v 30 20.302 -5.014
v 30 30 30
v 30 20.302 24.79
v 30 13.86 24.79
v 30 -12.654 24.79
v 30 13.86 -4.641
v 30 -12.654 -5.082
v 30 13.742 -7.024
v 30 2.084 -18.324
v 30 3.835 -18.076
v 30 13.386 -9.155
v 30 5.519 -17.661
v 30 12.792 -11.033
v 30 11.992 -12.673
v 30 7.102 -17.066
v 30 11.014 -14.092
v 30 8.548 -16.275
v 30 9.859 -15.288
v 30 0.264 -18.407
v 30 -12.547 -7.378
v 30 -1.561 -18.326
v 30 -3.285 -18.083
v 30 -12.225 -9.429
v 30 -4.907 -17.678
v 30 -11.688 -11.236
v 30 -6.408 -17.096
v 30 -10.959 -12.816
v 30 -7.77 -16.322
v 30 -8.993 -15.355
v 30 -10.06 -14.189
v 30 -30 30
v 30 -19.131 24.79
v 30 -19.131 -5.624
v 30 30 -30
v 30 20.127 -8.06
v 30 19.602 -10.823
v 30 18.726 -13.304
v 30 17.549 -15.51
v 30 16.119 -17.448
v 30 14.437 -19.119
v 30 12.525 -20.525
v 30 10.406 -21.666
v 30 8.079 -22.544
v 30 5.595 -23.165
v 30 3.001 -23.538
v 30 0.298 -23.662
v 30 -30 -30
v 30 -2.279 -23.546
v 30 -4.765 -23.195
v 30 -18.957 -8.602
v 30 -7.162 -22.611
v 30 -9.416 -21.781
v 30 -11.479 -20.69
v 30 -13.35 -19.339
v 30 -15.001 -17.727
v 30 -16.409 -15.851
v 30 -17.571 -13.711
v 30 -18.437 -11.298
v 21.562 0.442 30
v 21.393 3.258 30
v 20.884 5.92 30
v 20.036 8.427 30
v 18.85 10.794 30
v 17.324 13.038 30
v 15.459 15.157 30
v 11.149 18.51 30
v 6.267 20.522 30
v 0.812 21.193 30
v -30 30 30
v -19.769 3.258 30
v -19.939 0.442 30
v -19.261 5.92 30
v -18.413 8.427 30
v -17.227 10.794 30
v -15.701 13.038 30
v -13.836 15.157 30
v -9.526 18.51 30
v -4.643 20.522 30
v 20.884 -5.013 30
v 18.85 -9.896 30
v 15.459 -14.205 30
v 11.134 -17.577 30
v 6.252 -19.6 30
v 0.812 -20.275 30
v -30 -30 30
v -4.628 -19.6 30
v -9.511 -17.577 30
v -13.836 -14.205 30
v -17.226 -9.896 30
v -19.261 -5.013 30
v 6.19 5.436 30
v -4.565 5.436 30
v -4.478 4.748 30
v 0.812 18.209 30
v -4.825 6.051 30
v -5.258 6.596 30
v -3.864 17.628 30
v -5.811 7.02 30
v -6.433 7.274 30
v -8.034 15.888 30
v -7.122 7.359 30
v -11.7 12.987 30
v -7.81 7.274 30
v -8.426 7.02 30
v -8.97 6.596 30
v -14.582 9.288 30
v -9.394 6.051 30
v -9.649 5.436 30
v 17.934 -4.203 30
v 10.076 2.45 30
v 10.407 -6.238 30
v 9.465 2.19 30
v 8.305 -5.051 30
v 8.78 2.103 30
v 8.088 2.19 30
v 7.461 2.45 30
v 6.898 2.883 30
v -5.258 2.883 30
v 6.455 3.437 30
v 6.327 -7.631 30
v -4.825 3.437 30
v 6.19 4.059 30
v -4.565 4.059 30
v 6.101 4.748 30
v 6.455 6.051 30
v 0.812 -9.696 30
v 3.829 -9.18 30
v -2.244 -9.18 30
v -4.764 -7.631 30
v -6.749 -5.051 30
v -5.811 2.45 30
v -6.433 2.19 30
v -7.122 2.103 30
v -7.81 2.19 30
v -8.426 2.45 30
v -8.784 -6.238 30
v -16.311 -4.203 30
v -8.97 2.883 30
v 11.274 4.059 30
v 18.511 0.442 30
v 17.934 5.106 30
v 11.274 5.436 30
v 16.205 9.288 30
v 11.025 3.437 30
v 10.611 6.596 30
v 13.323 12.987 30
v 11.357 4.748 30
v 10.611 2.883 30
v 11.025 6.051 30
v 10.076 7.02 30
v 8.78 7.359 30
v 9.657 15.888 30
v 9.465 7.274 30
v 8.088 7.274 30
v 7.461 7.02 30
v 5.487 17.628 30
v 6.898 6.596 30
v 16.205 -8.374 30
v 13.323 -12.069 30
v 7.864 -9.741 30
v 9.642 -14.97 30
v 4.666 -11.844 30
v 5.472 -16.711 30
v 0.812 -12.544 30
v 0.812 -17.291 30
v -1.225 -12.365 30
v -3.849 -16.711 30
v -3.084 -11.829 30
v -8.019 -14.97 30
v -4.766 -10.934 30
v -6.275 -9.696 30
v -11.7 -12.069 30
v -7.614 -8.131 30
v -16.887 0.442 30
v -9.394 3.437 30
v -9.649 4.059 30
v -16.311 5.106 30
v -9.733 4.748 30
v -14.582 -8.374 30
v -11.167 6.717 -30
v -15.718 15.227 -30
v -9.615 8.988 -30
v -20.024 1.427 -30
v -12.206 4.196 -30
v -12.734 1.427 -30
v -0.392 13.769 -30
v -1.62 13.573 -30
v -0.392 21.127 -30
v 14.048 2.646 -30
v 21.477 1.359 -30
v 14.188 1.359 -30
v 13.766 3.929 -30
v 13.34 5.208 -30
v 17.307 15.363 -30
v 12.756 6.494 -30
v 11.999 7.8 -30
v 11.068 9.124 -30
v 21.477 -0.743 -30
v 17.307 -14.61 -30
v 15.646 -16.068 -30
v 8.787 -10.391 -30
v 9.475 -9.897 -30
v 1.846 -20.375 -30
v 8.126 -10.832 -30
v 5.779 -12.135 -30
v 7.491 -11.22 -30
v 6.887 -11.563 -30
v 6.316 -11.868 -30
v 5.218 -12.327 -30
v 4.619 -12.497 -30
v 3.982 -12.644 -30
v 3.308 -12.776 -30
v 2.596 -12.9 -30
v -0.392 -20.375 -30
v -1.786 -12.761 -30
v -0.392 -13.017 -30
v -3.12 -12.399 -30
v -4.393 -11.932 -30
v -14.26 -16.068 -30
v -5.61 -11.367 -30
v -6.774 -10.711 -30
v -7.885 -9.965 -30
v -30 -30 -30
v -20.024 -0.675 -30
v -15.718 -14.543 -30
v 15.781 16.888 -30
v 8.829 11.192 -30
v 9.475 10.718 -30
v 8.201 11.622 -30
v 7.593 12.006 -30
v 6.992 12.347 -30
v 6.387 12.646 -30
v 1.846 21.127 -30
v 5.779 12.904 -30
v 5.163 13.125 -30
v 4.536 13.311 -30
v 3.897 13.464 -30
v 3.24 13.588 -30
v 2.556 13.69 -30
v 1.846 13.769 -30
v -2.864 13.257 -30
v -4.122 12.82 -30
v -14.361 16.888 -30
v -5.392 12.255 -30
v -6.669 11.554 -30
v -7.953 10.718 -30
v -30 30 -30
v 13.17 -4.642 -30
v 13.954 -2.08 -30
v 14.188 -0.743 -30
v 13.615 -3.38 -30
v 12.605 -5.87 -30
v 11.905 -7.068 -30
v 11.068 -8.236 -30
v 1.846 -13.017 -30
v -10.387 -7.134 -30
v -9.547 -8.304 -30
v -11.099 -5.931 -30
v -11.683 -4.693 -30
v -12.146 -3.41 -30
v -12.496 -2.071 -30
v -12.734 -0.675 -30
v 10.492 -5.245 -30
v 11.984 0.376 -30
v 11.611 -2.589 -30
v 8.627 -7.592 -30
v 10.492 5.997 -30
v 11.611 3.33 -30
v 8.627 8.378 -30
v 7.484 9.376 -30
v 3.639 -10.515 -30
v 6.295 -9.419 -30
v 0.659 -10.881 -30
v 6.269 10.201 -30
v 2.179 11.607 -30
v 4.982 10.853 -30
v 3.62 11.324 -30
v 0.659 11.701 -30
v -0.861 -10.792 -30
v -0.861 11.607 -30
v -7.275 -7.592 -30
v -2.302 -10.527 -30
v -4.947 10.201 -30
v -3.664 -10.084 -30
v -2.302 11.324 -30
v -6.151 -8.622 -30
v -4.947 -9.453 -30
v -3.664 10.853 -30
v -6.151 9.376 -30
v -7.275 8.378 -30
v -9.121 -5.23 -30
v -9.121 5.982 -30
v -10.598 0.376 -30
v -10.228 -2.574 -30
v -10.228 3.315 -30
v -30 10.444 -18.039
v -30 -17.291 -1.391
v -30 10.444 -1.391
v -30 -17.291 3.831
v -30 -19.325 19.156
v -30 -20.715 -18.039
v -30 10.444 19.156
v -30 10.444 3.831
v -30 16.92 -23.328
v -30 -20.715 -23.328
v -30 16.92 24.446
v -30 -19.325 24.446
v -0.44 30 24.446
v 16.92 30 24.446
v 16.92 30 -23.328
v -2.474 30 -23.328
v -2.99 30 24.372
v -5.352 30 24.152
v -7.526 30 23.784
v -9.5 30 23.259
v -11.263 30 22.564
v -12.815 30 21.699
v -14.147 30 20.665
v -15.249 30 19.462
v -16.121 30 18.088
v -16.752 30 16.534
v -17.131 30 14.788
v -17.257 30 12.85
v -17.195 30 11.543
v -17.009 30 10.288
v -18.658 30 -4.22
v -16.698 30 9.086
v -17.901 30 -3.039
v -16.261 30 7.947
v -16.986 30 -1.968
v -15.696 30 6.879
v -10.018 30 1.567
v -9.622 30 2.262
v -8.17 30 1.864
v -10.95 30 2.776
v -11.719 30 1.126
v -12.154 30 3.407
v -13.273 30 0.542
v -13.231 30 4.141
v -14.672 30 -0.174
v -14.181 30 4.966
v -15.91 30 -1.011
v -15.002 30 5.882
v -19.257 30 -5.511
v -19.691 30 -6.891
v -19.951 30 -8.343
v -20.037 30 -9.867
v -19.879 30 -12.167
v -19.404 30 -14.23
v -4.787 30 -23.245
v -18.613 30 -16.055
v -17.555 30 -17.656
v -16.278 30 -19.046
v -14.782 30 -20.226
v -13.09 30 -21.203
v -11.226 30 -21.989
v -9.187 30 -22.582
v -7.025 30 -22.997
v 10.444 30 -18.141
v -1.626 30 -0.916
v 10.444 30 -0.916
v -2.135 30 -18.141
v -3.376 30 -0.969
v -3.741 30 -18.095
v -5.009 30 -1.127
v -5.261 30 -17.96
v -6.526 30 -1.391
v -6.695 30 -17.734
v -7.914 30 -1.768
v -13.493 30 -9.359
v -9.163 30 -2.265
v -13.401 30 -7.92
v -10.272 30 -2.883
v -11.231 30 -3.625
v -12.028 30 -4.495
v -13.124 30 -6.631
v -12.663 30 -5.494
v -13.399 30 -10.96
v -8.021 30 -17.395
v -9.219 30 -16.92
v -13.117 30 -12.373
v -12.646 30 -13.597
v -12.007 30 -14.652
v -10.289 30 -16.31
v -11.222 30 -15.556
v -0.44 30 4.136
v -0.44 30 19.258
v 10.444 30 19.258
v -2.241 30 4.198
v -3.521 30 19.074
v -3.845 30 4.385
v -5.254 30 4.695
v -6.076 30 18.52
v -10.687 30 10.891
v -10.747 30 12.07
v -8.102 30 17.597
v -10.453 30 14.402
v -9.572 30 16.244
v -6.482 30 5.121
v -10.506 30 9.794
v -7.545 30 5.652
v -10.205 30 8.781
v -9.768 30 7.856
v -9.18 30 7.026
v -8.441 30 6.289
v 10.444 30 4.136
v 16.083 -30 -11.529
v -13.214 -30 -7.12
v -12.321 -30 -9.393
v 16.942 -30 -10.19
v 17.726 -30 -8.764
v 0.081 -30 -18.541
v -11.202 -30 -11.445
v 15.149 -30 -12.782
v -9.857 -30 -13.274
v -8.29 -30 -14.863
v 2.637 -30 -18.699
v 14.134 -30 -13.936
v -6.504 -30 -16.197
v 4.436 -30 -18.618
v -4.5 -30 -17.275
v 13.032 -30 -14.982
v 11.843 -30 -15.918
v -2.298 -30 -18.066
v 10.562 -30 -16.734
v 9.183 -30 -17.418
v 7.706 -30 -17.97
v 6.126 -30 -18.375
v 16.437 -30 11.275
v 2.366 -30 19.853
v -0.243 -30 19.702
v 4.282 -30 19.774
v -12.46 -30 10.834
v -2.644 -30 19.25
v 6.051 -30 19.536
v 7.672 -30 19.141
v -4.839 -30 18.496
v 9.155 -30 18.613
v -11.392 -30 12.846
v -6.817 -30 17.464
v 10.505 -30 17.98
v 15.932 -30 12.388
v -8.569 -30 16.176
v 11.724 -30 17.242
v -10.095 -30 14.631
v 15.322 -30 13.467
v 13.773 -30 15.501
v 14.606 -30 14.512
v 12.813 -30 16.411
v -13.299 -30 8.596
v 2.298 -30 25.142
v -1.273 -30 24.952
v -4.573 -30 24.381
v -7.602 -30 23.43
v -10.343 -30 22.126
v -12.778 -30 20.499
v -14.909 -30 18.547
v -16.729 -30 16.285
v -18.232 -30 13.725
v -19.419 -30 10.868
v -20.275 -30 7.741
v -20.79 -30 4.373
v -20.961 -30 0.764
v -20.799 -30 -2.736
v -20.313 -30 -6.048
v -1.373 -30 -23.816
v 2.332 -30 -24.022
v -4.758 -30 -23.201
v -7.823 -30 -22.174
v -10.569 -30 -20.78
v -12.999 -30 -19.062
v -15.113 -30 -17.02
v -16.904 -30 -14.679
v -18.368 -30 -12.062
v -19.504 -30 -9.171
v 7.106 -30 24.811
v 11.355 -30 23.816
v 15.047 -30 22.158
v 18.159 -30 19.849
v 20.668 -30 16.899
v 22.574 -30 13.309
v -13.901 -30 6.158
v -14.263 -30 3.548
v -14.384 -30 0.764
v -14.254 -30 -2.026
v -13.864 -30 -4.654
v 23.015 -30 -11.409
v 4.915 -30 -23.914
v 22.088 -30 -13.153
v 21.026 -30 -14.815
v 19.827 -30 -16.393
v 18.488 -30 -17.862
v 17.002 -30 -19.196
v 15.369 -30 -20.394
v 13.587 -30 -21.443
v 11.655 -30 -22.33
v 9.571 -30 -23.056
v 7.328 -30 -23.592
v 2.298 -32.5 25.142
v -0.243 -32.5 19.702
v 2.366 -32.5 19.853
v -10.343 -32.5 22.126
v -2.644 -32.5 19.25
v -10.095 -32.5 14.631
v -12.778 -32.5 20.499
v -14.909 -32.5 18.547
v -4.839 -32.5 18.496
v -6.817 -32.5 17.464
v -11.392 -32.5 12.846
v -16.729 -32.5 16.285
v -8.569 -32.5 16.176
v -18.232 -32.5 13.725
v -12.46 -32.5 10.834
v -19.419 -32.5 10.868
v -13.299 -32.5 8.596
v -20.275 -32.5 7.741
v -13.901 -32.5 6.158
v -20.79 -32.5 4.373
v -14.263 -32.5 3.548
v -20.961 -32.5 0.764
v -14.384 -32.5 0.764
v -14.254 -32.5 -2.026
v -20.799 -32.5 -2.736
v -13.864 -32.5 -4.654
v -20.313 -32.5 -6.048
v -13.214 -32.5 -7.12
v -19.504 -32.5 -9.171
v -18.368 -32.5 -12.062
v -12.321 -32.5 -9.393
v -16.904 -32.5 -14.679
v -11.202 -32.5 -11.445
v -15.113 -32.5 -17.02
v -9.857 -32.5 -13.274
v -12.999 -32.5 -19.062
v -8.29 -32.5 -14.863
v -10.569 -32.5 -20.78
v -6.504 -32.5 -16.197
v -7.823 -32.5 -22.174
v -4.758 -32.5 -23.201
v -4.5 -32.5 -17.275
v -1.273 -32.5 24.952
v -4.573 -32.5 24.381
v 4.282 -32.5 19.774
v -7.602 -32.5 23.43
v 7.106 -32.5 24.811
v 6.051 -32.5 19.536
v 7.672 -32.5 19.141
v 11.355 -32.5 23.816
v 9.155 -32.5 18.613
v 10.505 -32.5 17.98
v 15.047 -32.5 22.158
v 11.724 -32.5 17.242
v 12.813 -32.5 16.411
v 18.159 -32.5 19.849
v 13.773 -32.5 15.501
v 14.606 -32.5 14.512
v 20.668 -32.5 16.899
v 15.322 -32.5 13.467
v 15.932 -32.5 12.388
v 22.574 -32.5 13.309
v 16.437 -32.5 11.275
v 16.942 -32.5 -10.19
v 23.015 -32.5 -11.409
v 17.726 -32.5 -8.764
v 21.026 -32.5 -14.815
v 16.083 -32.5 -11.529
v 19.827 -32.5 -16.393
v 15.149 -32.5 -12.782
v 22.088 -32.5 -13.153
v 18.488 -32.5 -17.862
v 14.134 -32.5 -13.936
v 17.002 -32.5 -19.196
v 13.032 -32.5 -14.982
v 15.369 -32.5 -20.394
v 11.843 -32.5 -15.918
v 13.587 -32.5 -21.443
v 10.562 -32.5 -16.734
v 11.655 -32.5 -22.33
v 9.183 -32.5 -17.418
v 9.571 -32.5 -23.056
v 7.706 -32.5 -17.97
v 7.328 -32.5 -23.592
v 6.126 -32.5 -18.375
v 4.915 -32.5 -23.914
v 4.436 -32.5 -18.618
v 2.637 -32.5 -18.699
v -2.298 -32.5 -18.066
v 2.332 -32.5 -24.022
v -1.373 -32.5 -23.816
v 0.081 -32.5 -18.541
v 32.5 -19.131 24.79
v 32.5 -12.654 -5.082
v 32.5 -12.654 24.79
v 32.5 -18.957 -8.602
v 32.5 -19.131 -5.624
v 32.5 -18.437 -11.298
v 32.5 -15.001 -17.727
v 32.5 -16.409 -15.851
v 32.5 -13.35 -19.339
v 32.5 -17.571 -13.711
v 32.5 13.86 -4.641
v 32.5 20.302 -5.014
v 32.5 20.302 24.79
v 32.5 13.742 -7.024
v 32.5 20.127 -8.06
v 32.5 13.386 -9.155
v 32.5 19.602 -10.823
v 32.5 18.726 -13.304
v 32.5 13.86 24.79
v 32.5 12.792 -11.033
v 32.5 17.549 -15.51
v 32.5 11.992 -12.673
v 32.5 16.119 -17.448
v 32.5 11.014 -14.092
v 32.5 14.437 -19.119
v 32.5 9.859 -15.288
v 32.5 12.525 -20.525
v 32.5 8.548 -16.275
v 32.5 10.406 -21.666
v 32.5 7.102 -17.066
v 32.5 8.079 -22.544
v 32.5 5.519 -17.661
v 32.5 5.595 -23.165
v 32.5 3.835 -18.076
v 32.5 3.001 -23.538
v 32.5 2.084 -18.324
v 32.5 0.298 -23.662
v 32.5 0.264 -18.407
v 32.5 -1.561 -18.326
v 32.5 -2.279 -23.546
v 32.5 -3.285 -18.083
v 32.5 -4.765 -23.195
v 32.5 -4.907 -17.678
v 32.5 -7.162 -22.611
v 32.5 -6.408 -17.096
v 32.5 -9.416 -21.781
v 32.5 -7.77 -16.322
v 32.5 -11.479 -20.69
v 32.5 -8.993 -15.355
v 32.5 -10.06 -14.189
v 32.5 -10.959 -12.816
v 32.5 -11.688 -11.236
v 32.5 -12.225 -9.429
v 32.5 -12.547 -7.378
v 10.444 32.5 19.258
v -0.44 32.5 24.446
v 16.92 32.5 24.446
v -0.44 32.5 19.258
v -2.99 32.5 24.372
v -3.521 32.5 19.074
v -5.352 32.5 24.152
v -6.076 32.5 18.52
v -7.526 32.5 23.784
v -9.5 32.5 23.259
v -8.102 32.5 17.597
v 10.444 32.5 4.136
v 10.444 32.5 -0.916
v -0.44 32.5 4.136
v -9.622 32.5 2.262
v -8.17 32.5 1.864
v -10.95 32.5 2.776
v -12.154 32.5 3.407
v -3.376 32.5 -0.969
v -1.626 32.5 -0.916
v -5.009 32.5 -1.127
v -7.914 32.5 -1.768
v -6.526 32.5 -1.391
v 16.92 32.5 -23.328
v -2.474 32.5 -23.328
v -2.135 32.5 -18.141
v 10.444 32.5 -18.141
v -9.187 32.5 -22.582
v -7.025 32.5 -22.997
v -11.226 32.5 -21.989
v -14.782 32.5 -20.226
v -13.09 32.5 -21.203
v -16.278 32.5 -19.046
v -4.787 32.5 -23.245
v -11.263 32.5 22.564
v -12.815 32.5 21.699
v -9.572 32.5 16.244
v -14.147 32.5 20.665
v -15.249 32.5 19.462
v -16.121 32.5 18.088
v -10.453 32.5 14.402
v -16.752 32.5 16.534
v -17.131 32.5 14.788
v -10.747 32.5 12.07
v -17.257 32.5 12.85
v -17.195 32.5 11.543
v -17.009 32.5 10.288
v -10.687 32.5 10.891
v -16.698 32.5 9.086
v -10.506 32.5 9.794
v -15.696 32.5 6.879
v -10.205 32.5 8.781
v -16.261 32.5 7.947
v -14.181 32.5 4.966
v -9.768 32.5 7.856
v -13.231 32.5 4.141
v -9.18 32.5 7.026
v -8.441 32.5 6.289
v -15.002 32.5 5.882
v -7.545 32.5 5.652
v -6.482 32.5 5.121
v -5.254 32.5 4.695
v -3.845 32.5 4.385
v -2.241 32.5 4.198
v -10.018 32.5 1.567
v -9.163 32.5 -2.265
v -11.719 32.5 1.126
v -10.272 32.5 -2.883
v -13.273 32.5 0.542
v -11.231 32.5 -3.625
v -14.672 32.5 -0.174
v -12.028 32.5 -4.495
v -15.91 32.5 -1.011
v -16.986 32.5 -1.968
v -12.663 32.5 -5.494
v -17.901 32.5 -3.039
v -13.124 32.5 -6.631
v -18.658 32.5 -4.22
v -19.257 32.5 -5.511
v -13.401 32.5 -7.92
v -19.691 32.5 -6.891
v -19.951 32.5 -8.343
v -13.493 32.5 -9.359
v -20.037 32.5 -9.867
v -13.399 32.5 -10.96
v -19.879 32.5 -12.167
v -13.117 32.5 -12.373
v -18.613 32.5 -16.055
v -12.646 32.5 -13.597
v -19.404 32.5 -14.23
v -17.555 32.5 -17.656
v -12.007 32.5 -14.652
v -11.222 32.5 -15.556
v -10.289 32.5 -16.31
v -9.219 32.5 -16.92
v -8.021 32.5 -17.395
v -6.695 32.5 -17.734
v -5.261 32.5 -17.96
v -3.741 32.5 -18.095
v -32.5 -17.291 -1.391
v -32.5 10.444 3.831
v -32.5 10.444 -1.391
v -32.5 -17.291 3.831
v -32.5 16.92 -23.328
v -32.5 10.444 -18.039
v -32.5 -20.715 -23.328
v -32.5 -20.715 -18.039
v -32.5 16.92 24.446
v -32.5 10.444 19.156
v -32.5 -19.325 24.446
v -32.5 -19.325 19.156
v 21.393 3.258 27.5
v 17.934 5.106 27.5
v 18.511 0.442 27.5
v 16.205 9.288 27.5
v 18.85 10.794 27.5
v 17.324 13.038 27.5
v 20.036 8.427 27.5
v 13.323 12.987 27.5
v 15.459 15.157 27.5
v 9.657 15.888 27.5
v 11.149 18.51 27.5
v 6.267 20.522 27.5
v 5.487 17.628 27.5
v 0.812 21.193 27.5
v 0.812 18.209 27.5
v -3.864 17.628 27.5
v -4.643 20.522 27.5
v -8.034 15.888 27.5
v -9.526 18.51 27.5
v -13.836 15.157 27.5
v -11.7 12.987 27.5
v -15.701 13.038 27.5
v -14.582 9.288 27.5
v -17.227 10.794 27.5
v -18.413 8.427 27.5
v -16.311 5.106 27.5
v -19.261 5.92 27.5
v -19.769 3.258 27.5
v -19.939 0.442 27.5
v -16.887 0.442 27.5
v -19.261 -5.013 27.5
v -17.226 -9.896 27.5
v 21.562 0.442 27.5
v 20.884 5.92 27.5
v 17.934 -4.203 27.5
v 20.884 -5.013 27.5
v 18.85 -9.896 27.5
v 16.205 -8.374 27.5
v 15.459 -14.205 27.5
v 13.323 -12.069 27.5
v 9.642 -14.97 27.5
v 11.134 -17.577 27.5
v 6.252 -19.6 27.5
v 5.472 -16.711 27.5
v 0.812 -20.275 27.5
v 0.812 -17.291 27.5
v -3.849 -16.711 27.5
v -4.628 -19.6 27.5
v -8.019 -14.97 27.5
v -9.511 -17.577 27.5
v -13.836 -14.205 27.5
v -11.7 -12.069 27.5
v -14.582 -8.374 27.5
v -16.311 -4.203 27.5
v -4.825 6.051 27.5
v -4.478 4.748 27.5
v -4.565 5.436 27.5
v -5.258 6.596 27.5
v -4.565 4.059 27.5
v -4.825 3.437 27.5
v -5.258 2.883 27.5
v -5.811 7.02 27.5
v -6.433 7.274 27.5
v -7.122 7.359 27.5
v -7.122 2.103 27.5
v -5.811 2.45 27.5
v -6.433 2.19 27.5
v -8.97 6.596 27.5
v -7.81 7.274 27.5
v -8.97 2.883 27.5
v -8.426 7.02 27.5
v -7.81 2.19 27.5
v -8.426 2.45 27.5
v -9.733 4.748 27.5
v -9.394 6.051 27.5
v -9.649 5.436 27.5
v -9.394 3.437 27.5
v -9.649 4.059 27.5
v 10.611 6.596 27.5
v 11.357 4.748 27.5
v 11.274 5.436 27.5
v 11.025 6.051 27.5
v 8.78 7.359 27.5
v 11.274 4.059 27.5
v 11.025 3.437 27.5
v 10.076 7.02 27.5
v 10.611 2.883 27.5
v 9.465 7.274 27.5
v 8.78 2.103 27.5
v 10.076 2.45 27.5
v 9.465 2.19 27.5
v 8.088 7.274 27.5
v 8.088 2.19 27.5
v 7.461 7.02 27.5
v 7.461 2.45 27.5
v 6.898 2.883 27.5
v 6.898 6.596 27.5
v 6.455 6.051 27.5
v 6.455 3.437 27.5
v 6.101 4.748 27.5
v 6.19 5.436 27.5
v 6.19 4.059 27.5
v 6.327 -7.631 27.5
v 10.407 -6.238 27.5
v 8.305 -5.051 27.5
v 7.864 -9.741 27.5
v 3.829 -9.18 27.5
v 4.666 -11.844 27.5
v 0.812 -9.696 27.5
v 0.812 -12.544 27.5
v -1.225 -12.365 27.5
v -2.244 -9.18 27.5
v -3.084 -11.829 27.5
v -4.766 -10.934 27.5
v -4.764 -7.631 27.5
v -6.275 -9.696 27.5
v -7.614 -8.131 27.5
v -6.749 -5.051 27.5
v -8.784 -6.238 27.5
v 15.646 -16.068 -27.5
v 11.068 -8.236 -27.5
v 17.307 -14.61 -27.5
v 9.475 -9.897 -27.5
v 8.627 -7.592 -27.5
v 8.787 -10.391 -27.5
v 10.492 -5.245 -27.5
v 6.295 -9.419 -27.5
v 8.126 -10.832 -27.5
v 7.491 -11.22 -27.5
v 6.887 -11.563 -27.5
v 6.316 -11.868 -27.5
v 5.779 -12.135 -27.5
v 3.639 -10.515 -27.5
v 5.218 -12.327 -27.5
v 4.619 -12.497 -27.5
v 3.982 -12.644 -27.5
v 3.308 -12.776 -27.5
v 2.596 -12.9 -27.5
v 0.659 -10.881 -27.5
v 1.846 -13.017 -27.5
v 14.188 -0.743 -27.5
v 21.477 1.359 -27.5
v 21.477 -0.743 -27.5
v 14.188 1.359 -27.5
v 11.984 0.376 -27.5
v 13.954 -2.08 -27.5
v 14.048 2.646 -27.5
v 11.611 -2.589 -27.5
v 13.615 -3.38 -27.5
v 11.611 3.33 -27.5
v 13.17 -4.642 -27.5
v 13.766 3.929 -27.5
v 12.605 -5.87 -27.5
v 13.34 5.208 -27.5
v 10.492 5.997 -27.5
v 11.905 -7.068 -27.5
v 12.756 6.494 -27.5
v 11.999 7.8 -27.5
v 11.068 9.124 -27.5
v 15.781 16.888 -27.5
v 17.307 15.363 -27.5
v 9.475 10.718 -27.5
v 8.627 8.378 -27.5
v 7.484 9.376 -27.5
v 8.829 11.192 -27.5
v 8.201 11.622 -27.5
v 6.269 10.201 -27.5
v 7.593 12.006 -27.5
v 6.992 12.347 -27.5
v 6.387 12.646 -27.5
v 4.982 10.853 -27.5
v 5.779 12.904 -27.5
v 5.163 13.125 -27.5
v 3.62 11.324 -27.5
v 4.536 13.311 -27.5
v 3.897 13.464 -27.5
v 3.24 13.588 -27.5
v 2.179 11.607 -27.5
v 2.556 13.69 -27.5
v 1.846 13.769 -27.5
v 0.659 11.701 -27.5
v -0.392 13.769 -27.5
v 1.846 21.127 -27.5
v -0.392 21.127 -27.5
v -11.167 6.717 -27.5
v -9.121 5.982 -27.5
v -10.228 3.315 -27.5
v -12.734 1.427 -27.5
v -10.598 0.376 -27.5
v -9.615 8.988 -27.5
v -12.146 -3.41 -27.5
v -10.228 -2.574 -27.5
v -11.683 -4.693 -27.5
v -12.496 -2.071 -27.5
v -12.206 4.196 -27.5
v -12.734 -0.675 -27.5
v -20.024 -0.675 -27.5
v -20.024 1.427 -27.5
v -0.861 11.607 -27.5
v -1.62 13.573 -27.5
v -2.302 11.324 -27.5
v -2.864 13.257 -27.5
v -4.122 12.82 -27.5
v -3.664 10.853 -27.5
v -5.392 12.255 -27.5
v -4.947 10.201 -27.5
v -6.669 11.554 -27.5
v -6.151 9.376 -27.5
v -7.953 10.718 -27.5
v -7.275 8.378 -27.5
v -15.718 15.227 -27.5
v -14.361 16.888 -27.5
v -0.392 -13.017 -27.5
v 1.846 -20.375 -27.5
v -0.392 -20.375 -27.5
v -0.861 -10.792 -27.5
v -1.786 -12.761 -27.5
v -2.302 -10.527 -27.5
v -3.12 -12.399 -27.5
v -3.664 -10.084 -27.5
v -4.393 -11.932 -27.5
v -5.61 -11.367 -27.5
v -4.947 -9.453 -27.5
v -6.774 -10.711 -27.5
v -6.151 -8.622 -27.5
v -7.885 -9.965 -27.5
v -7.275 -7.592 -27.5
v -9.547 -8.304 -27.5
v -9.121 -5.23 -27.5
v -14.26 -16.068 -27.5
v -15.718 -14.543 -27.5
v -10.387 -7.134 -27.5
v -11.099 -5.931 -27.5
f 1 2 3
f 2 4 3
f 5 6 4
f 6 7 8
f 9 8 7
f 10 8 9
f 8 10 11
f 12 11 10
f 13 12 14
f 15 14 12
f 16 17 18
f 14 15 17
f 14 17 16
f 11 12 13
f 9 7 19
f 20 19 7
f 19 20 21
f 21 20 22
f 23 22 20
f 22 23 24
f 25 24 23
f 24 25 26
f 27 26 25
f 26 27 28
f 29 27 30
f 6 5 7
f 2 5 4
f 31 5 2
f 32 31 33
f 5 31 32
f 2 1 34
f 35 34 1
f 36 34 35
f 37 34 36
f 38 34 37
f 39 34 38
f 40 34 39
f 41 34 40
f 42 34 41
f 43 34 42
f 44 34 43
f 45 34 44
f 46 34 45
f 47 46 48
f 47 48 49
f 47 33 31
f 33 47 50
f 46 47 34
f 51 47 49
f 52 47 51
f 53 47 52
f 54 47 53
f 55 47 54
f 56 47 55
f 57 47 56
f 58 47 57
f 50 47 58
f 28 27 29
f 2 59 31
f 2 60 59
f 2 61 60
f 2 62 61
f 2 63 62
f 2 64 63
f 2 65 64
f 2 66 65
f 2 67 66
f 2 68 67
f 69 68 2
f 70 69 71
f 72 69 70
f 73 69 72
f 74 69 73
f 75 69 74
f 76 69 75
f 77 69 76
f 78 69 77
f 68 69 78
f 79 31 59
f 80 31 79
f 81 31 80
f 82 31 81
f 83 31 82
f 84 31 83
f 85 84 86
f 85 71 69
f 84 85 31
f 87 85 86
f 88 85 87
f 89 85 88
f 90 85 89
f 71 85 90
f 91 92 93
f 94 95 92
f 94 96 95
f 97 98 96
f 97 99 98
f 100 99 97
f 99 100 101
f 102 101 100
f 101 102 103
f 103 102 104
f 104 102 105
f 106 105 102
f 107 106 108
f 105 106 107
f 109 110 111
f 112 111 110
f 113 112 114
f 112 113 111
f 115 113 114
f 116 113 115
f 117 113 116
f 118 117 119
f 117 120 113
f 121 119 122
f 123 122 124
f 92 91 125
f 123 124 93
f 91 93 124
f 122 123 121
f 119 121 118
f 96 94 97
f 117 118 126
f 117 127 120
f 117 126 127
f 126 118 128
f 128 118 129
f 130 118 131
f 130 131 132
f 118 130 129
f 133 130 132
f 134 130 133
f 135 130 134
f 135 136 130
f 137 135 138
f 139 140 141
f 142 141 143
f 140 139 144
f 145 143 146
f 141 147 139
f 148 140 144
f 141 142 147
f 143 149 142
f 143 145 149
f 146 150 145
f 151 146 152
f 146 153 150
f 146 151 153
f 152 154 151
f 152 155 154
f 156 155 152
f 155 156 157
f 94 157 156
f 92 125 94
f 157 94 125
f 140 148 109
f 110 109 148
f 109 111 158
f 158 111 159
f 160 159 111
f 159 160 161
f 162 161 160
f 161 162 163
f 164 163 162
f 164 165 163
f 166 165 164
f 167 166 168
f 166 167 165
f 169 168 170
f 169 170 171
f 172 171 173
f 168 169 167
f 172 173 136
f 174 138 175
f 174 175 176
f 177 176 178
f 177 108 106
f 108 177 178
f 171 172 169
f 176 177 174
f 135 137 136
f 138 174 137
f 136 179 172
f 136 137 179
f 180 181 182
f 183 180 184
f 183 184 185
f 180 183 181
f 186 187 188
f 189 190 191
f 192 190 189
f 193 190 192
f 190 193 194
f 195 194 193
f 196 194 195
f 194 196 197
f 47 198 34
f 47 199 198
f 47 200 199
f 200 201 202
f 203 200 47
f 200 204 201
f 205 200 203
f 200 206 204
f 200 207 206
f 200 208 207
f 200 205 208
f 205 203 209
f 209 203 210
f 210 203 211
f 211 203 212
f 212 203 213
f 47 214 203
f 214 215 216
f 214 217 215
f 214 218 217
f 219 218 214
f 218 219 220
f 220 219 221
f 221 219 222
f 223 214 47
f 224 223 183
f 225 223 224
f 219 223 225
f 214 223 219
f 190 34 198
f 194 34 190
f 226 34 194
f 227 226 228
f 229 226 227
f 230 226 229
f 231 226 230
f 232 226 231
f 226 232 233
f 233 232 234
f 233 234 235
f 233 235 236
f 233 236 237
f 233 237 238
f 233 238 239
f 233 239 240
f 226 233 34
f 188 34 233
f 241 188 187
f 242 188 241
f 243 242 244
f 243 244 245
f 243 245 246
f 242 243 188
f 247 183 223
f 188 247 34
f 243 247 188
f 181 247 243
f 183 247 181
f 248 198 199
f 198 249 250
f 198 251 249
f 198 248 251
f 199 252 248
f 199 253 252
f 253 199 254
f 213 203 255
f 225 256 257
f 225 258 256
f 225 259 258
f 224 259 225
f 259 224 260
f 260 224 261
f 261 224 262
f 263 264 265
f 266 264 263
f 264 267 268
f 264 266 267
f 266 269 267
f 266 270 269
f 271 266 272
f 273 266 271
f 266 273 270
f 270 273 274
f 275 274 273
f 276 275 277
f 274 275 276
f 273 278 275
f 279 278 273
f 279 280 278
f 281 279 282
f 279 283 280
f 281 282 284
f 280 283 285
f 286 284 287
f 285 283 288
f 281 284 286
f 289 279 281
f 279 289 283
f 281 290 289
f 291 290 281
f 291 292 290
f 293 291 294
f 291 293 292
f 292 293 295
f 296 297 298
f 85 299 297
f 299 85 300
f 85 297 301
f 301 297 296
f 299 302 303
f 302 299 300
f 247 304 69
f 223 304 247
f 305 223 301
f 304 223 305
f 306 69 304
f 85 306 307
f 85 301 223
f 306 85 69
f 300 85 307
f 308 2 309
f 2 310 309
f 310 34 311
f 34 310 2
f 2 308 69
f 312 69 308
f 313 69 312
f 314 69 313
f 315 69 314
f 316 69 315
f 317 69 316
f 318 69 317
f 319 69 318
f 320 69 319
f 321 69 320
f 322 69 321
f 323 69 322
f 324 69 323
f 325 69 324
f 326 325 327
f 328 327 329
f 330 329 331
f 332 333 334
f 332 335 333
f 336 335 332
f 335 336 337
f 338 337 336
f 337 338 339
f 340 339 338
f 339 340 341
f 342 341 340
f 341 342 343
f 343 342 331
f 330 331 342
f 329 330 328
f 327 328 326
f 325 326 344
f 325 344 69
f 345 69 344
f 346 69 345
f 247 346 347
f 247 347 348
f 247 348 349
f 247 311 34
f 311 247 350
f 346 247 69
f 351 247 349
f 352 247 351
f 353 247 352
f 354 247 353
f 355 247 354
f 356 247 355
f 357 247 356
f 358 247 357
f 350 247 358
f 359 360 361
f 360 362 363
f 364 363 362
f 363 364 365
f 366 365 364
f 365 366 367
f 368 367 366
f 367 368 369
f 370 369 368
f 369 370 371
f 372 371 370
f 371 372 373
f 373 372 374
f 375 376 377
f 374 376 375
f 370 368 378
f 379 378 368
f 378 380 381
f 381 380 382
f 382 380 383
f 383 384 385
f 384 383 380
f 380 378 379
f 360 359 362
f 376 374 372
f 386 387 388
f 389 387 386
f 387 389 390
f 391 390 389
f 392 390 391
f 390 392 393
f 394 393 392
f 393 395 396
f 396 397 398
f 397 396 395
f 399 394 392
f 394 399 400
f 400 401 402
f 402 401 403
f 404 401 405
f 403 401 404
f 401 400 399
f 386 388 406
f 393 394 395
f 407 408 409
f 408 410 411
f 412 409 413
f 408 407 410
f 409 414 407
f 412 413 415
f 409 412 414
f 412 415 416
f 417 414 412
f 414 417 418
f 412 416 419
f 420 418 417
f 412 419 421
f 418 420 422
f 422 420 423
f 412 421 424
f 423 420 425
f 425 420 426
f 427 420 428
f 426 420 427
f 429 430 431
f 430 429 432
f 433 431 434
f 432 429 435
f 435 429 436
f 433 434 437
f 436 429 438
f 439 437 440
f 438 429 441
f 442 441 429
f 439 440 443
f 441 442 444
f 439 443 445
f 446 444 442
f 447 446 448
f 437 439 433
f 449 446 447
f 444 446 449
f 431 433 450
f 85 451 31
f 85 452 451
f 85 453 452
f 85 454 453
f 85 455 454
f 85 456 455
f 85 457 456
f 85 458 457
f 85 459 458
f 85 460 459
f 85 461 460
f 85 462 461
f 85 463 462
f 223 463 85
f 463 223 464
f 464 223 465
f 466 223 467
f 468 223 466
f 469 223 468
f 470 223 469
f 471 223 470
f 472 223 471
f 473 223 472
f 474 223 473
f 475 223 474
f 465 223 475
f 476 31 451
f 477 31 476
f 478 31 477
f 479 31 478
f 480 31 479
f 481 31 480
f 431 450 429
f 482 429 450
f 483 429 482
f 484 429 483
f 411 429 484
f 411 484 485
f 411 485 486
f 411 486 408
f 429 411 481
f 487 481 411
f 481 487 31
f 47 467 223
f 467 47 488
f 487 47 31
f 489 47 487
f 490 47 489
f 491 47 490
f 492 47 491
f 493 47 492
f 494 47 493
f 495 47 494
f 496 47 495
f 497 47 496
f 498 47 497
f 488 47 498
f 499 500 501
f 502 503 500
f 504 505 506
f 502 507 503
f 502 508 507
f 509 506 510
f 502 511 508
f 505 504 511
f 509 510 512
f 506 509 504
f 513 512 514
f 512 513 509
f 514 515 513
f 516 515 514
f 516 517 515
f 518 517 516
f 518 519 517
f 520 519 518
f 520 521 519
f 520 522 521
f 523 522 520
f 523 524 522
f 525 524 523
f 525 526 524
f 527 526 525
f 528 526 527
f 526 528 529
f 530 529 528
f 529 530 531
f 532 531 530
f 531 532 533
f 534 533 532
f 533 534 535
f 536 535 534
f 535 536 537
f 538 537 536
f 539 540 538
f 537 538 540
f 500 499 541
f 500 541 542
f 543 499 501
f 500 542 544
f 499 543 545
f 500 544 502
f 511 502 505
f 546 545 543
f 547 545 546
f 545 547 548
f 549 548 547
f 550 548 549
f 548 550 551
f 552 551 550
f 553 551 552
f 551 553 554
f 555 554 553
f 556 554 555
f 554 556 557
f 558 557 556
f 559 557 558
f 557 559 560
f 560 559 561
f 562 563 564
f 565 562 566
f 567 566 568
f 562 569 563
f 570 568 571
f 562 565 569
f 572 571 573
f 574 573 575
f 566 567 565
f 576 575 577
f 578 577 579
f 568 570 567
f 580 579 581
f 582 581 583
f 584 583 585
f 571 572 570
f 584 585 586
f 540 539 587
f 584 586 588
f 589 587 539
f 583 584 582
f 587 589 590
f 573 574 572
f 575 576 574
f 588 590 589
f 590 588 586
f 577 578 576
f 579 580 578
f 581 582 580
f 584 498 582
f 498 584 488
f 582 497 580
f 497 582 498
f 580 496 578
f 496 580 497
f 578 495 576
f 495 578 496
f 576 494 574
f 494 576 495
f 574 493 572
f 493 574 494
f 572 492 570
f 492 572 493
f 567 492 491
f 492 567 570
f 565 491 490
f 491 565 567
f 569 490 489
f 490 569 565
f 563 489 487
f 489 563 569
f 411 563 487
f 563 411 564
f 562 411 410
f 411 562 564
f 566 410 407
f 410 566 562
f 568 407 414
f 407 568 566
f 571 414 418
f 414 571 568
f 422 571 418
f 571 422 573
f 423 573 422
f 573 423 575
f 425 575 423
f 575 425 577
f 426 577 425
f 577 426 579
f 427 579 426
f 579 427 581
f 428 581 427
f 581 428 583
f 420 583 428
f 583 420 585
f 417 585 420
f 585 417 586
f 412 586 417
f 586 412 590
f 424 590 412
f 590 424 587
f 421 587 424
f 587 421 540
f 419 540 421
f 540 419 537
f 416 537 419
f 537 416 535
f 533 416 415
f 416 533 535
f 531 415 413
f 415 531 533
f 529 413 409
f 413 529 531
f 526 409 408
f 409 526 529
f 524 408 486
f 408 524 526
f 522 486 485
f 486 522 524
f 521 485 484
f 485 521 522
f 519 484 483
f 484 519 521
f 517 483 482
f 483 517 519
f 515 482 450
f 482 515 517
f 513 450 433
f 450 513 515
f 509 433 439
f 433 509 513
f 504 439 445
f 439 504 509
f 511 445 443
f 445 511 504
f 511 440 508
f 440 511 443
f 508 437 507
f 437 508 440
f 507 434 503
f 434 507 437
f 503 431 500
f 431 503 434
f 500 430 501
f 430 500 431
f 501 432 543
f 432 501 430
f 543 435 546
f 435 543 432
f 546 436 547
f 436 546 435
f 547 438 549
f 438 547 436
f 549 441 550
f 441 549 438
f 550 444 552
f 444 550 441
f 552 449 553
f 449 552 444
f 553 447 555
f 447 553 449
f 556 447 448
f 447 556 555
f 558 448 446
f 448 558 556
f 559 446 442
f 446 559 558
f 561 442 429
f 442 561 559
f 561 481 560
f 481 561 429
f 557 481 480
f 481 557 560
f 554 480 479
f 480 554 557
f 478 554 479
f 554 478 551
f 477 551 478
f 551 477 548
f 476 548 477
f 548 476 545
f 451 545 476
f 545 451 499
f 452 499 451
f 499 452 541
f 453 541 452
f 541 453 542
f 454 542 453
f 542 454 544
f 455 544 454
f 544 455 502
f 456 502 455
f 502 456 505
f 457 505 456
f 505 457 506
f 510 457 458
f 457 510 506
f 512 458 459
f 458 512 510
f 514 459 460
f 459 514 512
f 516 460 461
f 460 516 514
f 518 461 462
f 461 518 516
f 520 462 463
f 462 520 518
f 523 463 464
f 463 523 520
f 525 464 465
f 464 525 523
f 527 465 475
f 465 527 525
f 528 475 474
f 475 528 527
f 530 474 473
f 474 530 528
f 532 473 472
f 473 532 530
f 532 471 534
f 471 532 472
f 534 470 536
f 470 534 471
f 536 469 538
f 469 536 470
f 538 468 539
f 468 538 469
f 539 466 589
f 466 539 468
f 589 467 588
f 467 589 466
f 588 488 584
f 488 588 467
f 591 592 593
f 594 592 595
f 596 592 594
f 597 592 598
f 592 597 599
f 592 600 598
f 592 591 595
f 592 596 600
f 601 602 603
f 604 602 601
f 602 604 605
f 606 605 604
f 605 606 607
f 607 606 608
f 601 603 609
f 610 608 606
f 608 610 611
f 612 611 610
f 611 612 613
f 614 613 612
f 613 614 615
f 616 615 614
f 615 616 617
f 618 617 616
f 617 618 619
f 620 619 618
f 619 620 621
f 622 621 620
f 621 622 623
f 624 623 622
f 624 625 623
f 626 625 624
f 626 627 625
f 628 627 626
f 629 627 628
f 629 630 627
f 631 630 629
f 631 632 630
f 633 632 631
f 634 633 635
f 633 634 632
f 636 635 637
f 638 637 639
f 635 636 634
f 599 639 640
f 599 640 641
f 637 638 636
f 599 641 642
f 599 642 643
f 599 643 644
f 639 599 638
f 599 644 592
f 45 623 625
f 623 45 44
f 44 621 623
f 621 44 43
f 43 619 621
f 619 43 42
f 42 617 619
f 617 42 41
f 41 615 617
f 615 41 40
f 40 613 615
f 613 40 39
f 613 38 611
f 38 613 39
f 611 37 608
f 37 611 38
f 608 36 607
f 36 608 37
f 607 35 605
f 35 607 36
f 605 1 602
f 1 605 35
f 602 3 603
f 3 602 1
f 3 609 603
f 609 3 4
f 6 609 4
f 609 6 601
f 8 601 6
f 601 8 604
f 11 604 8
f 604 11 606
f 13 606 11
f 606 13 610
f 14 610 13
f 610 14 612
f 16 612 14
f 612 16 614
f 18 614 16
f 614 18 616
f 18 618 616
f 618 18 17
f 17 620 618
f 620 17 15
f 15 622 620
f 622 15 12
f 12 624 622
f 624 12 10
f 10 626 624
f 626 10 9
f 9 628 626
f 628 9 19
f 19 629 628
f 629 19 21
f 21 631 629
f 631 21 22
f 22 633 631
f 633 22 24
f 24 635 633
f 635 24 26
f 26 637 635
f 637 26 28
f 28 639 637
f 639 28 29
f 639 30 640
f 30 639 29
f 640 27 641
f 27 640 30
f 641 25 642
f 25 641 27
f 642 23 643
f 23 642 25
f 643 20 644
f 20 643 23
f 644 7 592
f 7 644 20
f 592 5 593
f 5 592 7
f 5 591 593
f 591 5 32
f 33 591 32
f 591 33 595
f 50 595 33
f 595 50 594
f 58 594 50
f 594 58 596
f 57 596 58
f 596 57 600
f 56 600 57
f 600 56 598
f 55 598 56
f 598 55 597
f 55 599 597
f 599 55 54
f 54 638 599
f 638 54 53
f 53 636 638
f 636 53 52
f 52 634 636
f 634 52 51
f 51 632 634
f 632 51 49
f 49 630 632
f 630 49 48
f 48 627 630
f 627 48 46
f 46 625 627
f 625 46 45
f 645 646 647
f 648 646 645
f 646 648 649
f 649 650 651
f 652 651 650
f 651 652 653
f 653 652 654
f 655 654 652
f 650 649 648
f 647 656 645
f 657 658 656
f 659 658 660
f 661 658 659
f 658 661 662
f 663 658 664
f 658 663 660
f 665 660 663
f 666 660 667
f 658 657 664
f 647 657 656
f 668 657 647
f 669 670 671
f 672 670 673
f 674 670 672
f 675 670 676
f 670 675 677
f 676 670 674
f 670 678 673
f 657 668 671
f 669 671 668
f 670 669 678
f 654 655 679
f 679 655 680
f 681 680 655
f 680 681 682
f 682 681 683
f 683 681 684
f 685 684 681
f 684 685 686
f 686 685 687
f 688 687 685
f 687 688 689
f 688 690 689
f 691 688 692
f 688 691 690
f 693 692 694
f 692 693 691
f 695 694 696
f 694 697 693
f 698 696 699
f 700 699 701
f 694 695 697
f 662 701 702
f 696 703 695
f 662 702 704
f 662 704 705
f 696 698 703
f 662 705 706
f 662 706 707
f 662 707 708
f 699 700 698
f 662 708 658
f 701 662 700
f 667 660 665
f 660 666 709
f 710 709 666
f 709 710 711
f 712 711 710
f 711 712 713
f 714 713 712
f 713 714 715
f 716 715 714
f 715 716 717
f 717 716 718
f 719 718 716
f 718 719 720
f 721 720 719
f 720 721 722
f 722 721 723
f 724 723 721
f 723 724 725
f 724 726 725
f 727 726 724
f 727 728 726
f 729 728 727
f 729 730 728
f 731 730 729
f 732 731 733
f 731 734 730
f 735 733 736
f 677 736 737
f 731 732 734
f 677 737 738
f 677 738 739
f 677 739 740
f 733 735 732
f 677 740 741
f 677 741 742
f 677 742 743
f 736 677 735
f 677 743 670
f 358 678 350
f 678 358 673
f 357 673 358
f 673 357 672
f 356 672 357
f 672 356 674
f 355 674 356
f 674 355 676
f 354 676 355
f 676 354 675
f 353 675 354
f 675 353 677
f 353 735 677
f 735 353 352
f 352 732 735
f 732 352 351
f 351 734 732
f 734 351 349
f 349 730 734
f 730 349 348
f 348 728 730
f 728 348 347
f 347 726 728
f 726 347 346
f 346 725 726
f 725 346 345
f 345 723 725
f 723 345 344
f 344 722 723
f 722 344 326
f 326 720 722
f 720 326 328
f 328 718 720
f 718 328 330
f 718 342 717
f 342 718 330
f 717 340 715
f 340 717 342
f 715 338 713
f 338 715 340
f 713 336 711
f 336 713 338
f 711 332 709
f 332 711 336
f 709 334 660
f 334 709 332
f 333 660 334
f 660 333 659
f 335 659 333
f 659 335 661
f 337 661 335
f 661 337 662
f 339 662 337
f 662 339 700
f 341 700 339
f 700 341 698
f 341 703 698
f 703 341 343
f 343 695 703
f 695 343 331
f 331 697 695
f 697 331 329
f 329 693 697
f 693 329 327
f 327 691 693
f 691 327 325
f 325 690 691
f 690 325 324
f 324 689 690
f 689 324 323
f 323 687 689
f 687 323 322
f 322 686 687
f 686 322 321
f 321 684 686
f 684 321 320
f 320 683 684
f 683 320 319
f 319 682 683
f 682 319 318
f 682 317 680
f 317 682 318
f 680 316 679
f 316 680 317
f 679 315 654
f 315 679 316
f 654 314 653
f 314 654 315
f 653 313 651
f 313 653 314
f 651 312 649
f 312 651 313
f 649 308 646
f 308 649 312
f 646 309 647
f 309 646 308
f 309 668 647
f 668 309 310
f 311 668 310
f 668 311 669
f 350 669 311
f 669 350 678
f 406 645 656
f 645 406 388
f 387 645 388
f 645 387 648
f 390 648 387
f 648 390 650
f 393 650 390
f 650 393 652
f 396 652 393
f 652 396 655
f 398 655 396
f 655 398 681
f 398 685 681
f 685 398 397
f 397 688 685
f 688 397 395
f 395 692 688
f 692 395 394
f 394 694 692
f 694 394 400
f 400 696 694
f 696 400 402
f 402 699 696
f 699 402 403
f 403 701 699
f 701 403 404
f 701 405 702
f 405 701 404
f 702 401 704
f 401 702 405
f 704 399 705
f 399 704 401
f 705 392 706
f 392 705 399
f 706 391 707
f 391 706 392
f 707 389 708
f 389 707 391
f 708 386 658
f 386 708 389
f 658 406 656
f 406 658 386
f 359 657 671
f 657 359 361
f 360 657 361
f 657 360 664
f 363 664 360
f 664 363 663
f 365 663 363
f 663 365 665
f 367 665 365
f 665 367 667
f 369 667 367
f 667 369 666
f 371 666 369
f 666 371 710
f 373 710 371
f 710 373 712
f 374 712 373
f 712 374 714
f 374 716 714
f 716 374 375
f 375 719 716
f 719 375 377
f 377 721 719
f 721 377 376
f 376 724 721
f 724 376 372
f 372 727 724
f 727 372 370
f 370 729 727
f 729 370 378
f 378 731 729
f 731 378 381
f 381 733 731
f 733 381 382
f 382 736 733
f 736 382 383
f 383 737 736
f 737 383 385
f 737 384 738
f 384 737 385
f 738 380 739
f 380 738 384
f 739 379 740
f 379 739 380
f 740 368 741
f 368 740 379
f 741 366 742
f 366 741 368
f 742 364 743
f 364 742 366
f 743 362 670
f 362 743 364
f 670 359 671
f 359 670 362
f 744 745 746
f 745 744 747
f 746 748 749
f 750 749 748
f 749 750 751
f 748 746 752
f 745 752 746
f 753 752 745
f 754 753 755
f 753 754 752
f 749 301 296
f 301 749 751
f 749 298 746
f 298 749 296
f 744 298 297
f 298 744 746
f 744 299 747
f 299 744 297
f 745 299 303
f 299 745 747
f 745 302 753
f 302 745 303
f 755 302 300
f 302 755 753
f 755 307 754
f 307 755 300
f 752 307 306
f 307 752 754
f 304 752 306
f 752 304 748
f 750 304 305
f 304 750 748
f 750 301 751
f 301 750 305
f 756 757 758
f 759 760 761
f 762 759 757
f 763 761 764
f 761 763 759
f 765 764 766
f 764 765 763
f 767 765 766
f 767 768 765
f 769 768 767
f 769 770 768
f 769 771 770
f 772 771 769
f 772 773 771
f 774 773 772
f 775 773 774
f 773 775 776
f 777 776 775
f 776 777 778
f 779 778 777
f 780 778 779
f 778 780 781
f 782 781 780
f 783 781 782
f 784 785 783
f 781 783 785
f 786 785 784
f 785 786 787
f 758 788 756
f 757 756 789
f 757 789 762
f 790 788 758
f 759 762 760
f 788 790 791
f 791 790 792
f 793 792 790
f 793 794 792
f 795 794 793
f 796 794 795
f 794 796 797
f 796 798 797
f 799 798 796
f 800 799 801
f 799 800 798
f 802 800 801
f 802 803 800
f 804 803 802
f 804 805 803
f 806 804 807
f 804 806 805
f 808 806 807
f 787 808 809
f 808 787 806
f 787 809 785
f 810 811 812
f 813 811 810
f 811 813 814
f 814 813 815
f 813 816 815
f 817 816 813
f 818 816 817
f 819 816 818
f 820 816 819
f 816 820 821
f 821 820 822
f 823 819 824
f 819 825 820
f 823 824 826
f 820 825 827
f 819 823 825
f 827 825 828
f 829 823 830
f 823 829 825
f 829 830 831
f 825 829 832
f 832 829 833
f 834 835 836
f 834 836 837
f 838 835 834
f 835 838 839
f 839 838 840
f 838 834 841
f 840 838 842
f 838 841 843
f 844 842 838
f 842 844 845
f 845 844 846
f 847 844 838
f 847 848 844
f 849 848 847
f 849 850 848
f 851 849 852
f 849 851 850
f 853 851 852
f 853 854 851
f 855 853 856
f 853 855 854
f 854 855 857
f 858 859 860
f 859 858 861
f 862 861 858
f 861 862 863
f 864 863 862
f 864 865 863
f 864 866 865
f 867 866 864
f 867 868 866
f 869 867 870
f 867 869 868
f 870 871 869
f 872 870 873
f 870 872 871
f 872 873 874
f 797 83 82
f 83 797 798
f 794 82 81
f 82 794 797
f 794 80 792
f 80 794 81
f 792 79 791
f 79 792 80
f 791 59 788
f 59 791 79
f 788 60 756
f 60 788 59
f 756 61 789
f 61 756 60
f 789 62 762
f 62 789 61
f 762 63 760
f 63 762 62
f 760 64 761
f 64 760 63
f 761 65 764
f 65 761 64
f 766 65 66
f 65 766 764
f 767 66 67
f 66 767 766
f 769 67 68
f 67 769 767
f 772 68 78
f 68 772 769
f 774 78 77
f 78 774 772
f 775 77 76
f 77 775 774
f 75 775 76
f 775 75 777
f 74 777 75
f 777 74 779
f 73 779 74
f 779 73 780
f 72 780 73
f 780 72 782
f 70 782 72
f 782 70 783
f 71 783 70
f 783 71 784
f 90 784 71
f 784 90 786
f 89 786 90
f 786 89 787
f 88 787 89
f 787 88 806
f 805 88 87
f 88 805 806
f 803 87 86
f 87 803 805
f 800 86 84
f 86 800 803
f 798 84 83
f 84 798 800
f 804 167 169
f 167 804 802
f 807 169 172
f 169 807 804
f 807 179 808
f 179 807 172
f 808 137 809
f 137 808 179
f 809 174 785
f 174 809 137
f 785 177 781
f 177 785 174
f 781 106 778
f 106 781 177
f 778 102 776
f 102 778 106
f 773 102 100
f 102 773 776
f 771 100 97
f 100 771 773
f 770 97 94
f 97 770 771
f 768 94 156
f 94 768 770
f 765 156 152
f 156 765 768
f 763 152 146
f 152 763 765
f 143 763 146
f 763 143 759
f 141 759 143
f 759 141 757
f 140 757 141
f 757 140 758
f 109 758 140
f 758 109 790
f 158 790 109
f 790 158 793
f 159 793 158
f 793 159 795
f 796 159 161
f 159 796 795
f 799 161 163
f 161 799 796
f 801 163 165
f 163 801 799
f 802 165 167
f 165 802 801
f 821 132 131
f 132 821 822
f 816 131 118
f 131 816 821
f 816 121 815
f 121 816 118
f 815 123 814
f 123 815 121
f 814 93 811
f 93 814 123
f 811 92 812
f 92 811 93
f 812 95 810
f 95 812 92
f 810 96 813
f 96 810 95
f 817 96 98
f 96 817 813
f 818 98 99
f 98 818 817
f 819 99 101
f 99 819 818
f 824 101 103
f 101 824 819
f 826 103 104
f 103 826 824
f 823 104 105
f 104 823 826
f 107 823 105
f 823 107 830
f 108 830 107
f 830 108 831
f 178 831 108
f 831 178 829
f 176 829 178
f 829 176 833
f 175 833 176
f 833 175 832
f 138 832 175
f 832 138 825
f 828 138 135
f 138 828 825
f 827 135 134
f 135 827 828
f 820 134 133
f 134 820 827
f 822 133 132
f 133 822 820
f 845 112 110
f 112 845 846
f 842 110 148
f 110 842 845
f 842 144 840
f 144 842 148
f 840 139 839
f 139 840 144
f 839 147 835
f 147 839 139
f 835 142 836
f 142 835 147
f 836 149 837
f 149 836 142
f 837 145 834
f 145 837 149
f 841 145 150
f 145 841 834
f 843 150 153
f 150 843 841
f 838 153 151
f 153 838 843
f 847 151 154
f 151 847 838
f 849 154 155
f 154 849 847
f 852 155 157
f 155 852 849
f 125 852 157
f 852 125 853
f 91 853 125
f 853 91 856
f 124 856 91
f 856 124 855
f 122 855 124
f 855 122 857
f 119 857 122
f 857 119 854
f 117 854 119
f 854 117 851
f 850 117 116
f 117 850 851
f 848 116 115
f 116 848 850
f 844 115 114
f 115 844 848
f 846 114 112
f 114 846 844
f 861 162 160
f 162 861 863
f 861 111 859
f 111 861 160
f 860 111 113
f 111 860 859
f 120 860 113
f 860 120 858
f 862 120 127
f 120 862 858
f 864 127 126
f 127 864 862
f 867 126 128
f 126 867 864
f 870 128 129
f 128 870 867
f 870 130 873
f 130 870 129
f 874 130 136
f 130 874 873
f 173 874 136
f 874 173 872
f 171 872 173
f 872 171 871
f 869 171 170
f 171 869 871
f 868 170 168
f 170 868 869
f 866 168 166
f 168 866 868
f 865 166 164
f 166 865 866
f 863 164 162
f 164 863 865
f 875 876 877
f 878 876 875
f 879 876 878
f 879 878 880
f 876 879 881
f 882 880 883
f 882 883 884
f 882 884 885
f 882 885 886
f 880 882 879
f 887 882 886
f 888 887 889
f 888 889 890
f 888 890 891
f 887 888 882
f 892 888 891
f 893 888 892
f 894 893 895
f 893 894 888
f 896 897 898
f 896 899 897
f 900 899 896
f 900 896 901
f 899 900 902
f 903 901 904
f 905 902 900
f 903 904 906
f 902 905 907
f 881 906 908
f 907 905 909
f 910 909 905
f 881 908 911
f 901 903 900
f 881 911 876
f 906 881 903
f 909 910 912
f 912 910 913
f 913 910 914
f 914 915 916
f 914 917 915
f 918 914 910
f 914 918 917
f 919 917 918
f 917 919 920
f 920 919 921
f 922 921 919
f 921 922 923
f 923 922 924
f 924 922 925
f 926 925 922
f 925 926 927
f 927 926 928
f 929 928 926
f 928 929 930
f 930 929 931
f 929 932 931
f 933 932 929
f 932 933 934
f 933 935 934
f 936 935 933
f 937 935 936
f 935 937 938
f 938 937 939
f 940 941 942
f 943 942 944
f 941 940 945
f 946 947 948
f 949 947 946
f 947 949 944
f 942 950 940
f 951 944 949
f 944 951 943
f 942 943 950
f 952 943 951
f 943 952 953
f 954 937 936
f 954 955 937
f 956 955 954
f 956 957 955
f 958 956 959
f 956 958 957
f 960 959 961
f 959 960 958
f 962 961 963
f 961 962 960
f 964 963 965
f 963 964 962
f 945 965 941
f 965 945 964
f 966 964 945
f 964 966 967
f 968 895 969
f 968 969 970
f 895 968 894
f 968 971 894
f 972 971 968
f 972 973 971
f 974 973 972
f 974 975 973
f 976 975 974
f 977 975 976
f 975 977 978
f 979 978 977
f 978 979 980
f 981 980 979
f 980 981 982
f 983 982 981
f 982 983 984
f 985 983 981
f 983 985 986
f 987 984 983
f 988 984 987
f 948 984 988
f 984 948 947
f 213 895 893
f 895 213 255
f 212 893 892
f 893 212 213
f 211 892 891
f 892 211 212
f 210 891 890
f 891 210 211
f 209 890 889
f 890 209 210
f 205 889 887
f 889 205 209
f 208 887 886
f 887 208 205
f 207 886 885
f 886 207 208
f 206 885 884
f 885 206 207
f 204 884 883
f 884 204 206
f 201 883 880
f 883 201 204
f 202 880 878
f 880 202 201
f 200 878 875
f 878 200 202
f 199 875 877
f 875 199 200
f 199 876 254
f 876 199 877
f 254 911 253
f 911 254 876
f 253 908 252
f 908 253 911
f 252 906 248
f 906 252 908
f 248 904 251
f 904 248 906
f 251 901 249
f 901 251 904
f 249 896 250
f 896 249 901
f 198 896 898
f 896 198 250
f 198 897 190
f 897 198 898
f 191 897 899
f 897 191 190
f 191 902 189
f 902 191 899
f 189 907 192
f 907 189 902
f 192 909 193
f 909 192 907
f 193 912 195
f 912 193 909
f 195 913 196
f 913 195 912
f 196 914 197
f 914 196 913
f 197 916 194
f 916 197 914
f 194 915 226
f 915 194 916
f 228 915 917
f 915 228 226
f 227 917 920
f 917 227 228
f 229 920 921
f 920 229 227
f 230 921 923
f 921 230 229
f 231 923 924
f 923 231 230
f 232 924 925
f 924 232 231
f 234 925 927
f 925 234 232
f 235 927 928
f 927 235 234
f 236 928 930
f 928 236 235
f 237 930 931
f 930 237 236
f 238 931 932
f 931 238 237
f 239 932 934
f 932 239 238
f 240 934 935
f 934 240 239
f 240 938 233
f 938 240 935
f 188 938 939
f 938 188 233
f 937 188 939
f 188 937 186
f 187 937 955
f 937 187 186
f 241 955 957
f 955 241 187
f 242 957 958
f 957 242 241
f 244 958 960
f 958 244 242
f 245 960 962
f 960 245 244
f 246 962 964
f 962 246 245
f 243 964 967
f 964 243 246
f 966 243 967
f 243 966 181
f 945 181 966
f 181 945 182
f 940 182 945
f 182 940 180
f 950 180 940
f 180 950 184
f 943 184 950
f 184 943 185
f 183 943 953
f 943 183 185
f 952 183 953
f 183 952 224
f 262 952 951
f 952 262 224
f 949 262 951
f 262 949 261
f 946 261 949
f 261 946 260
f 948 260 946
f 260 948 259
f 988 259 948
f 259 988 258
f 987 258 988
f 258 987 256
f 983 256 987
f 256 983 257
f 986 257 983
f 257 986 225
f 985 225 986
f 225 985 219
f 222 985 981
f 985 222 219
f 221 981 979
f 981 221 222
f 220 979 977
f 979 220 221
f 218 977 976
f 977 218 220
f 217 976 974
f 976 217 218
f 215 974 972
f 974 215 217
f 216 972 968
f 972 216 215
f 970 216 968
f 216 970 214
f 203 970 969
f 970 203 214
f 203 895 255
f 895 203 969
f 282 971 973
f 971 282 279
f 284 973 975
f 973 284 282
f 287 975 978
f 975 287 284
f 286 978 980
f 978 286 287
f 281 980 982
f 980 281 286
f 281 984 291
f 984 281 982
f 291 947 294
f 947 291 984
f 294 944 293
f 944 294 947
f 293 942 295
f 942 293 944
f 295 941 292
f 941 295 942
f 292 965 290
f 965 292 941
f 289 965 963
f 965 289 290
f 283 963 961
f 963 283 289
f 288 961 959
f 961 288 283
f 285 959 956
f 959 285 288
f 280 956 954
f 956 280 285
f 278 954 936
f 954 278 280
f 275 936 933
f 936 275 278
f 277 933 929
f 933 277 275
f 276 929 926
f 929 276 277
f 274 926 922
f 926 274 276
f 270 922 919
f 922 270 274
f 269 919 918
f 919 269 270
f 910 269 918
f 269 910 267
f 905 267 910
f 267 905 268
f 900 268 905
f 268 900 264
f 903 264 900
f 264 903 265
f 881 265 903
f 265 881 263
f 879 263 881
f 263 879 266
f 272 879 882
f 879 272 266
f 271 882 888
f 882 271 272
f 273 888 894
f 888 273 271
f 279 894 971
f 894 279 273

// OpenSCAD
echo(version=version());

font = "Liberation Sans";

cube_size = 60;
letter_size = 50;
letter_height = 5;

o = cube_size / 2 - letter_height / 2;

module letter(l) {
	// Use linear_extrude() to make the letters 3D objects as they
	// are only 2D shapes when only using text()
	linear_extrude(height = letter_height) {
		text(l, size = letter_size, font = font, halign = "center", valign = "center", $fn = 16);
	}
}

difference() {
	union() {
		color("gray") cube(cube_size, center = true);
		translate([0, -o, 0]) rotate([90, 0, 0]) letter("C");
		translate([o, 0, 0]) rotate([90, 0, 90]) letter("U");
		translate([0, o, 0]) rotate([90, 0, 180]) letter("B");
		translate([-o, 0, 0]) rotate([90, 0, -90]) letter("E");
	}

	// Put some symbols on top and bottom using symbols from the
	// Unicode symbols table.
	// (see https://en.wikipedia.org/wiki/Miscellaneous_Symbols)
	//
	// Note that depending on the font used, not all the symbols
	// are actually available.
	translate([0, 0, o])  letter("\u263A");
	translate([0, 0, -o - letter_height])  letter("\u263C");
}
